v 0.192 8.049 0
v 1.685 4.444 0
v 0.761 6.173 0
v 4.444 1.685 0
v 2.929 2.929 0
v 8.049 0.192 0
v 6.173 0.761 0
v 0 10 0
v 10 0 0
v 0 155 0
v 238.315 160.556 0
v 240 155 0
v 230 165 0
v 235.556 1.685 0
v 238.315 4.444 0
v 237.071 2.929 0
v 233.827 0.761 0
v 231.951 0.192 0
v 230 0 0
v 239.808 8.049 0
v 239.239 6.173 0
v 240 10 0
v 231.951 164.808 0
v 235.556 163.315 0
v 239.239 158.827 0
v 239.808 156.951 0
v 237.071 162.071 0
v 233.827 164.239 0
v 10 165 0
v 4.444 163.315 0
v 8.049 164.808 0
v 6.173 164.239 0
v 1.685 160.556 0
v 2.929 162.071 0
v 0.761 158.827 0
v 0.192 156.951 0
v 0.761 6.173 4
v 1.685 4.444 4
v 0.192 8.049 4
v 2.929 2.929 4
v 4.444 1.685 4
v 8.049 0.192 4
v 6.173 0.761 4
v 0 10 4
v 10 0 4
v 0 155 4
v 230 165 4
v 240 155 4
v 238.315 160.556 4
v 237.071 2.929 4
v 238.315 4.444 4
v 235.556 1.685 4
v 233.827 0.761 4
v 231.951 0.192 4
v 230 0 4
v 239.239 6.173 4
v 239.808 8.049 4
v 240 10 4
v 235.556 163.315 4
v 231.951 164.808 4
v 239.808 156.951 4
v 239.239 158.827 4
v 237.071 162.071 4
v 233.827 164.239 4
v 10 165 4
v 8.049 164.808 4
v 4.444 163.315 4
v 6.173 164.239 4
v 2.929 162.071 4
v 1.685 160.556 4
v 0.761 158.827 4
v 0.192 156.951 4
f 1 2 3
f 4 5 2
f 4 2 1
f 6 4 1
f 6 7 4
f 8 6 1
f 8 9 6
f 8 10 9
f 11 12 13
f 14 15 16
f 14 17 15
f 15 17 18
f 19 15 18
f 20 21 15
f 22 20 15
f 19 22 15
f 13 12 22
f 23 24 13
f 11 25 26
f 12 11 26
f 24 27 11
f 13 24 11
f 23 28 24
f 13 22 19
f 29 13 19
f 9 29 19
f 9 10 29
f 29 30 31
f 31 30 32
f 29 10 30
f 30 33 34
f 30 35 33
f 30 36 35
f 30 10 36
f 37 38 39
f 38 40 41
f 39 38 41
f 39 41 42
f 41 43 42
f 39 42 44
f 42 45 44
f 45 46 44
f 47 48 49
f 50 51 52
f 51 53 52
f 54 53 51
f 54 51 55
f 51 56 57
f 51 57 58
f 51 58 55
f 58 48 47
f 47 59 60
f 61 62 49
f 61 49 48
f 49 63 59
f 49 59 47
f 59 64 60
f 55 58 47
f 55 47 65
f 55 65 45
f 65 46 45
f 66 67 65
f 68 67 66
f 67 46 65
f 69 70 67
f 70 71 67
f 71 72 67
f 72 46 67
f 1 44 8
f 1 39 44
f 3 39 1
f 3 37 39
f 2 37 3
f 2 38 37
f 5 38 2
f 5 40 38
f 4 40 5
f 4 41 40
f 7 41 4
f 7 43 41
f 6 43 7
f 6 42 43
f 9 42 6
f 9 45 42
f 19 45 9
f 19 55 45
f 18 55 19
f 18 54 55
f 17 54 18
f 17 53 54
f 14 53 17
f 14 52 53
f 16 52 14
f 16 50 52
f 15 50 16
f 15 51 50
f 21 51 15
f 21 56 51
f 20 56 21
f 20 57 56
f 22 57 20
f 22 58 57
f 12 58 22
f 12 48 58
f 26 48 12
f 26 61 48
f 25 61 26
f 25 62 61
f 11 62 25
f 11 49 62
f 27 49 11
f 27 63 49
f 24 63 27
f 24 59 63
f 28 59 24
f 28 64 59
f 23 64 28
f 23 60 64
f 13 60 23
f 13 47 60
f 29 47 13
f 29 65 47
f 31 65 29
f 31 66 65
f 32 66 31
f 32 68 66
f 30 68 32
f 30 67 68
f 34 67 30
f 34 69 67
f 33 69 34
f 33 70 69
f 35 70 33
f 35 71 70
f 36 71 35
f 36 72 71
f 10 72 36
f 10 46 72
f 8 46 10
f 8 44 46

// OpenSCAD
// file: rounded_box.scad
/**
 * Small "library" for creating boxes with rounded edges.
 *
 * Hendrik Busch, 2017-18 (https://github.com/hmbusch)
 *
 */
 
/**
 * Creates a 2D-shape of a box with the given dimensions and rounded edges. 
 * Be sure to increase $fn for nicer edges.
 *
 * @param width
 *          the desired width of the box (default is 10mm)
 * @param depth
 *          the desired depth of the box (default is 10mm)
 * @param height
 *          the desired height of the box (default is 10mm)
 * @param edge_radius
 *          the radius of all the edges on the xy-plane (default is 2mm)
 */  
module box_with_round_edges_2d(width = 10, depth = 10, edge_radius = 2) {
    ed = edge_radius * 2;
    translate([edge_radius, edge_radius, 0]) hull() {
        circle(d = ed);
        translate([width - ed, 0, 0]) circle(d = ed);
        translate([0, depth - ed, 0]) circle(d = ed);
        translate([width - ed, depth - ed, 0]) circle(d = ed);    
    }
}
 
/**
 * Call to create a box with rounded edges (edges will be round on one plane only).
 * Be sure to increase $fn for nicer edges.
 * 
 * @param width
 *          the desired width of the box (default is 10mm)
 * @param depth
 *          the desired depth of the box (default is 10mm)
 * @param height
 *          the desired height of the box (default is 10mm)
 * @param edge_radius
 *          the radius of all the edges on the xy-plane (default is 2mm)
 *
 */
module box_with_round_edges_3d(width = 10, depth = 10, height = 10, edge_radius = 2) {
	linear_extrude(height = height) {
		box_with_round_edges_2d(width, depth, edge_radius);
	}
}

/**
 * Call to create a box with rounded edges (edges will be round on one plane only).
 * Be sure to increase $fn for nicer edges. This module has inputs that resemble
 * those of cube() so that it can act as a drop-in replacement.
 * 
 * @param dimensions
 *          3-value-array with x, y and z dimensions (default is 10x10x10mm).
 * @param edge_radius
 *          the radius of all the edges on the xy-plane (default is 2mm)
 *
 */
module box_with_round_edges_3d(dimensions = [10, 10, 10], edge_radius = 2) {
	linear_extrude(height = dimensions[2]) {
		box_with_round_edges_2d(dimensions[0], dimensions[1], edge_radius);
	}
}
// main file
use <rounded_box.scad>;

$fn = 32;

color("white") box_with_round_edges_3d([240, 165, 4], 10);

color ("black") 
    translate([26, 0, 4]) 
        linear_extrude(height = 1)
            resize([220, 0, 0], auto = true) 
            import(file = "apollo11_plaque.dxf");
